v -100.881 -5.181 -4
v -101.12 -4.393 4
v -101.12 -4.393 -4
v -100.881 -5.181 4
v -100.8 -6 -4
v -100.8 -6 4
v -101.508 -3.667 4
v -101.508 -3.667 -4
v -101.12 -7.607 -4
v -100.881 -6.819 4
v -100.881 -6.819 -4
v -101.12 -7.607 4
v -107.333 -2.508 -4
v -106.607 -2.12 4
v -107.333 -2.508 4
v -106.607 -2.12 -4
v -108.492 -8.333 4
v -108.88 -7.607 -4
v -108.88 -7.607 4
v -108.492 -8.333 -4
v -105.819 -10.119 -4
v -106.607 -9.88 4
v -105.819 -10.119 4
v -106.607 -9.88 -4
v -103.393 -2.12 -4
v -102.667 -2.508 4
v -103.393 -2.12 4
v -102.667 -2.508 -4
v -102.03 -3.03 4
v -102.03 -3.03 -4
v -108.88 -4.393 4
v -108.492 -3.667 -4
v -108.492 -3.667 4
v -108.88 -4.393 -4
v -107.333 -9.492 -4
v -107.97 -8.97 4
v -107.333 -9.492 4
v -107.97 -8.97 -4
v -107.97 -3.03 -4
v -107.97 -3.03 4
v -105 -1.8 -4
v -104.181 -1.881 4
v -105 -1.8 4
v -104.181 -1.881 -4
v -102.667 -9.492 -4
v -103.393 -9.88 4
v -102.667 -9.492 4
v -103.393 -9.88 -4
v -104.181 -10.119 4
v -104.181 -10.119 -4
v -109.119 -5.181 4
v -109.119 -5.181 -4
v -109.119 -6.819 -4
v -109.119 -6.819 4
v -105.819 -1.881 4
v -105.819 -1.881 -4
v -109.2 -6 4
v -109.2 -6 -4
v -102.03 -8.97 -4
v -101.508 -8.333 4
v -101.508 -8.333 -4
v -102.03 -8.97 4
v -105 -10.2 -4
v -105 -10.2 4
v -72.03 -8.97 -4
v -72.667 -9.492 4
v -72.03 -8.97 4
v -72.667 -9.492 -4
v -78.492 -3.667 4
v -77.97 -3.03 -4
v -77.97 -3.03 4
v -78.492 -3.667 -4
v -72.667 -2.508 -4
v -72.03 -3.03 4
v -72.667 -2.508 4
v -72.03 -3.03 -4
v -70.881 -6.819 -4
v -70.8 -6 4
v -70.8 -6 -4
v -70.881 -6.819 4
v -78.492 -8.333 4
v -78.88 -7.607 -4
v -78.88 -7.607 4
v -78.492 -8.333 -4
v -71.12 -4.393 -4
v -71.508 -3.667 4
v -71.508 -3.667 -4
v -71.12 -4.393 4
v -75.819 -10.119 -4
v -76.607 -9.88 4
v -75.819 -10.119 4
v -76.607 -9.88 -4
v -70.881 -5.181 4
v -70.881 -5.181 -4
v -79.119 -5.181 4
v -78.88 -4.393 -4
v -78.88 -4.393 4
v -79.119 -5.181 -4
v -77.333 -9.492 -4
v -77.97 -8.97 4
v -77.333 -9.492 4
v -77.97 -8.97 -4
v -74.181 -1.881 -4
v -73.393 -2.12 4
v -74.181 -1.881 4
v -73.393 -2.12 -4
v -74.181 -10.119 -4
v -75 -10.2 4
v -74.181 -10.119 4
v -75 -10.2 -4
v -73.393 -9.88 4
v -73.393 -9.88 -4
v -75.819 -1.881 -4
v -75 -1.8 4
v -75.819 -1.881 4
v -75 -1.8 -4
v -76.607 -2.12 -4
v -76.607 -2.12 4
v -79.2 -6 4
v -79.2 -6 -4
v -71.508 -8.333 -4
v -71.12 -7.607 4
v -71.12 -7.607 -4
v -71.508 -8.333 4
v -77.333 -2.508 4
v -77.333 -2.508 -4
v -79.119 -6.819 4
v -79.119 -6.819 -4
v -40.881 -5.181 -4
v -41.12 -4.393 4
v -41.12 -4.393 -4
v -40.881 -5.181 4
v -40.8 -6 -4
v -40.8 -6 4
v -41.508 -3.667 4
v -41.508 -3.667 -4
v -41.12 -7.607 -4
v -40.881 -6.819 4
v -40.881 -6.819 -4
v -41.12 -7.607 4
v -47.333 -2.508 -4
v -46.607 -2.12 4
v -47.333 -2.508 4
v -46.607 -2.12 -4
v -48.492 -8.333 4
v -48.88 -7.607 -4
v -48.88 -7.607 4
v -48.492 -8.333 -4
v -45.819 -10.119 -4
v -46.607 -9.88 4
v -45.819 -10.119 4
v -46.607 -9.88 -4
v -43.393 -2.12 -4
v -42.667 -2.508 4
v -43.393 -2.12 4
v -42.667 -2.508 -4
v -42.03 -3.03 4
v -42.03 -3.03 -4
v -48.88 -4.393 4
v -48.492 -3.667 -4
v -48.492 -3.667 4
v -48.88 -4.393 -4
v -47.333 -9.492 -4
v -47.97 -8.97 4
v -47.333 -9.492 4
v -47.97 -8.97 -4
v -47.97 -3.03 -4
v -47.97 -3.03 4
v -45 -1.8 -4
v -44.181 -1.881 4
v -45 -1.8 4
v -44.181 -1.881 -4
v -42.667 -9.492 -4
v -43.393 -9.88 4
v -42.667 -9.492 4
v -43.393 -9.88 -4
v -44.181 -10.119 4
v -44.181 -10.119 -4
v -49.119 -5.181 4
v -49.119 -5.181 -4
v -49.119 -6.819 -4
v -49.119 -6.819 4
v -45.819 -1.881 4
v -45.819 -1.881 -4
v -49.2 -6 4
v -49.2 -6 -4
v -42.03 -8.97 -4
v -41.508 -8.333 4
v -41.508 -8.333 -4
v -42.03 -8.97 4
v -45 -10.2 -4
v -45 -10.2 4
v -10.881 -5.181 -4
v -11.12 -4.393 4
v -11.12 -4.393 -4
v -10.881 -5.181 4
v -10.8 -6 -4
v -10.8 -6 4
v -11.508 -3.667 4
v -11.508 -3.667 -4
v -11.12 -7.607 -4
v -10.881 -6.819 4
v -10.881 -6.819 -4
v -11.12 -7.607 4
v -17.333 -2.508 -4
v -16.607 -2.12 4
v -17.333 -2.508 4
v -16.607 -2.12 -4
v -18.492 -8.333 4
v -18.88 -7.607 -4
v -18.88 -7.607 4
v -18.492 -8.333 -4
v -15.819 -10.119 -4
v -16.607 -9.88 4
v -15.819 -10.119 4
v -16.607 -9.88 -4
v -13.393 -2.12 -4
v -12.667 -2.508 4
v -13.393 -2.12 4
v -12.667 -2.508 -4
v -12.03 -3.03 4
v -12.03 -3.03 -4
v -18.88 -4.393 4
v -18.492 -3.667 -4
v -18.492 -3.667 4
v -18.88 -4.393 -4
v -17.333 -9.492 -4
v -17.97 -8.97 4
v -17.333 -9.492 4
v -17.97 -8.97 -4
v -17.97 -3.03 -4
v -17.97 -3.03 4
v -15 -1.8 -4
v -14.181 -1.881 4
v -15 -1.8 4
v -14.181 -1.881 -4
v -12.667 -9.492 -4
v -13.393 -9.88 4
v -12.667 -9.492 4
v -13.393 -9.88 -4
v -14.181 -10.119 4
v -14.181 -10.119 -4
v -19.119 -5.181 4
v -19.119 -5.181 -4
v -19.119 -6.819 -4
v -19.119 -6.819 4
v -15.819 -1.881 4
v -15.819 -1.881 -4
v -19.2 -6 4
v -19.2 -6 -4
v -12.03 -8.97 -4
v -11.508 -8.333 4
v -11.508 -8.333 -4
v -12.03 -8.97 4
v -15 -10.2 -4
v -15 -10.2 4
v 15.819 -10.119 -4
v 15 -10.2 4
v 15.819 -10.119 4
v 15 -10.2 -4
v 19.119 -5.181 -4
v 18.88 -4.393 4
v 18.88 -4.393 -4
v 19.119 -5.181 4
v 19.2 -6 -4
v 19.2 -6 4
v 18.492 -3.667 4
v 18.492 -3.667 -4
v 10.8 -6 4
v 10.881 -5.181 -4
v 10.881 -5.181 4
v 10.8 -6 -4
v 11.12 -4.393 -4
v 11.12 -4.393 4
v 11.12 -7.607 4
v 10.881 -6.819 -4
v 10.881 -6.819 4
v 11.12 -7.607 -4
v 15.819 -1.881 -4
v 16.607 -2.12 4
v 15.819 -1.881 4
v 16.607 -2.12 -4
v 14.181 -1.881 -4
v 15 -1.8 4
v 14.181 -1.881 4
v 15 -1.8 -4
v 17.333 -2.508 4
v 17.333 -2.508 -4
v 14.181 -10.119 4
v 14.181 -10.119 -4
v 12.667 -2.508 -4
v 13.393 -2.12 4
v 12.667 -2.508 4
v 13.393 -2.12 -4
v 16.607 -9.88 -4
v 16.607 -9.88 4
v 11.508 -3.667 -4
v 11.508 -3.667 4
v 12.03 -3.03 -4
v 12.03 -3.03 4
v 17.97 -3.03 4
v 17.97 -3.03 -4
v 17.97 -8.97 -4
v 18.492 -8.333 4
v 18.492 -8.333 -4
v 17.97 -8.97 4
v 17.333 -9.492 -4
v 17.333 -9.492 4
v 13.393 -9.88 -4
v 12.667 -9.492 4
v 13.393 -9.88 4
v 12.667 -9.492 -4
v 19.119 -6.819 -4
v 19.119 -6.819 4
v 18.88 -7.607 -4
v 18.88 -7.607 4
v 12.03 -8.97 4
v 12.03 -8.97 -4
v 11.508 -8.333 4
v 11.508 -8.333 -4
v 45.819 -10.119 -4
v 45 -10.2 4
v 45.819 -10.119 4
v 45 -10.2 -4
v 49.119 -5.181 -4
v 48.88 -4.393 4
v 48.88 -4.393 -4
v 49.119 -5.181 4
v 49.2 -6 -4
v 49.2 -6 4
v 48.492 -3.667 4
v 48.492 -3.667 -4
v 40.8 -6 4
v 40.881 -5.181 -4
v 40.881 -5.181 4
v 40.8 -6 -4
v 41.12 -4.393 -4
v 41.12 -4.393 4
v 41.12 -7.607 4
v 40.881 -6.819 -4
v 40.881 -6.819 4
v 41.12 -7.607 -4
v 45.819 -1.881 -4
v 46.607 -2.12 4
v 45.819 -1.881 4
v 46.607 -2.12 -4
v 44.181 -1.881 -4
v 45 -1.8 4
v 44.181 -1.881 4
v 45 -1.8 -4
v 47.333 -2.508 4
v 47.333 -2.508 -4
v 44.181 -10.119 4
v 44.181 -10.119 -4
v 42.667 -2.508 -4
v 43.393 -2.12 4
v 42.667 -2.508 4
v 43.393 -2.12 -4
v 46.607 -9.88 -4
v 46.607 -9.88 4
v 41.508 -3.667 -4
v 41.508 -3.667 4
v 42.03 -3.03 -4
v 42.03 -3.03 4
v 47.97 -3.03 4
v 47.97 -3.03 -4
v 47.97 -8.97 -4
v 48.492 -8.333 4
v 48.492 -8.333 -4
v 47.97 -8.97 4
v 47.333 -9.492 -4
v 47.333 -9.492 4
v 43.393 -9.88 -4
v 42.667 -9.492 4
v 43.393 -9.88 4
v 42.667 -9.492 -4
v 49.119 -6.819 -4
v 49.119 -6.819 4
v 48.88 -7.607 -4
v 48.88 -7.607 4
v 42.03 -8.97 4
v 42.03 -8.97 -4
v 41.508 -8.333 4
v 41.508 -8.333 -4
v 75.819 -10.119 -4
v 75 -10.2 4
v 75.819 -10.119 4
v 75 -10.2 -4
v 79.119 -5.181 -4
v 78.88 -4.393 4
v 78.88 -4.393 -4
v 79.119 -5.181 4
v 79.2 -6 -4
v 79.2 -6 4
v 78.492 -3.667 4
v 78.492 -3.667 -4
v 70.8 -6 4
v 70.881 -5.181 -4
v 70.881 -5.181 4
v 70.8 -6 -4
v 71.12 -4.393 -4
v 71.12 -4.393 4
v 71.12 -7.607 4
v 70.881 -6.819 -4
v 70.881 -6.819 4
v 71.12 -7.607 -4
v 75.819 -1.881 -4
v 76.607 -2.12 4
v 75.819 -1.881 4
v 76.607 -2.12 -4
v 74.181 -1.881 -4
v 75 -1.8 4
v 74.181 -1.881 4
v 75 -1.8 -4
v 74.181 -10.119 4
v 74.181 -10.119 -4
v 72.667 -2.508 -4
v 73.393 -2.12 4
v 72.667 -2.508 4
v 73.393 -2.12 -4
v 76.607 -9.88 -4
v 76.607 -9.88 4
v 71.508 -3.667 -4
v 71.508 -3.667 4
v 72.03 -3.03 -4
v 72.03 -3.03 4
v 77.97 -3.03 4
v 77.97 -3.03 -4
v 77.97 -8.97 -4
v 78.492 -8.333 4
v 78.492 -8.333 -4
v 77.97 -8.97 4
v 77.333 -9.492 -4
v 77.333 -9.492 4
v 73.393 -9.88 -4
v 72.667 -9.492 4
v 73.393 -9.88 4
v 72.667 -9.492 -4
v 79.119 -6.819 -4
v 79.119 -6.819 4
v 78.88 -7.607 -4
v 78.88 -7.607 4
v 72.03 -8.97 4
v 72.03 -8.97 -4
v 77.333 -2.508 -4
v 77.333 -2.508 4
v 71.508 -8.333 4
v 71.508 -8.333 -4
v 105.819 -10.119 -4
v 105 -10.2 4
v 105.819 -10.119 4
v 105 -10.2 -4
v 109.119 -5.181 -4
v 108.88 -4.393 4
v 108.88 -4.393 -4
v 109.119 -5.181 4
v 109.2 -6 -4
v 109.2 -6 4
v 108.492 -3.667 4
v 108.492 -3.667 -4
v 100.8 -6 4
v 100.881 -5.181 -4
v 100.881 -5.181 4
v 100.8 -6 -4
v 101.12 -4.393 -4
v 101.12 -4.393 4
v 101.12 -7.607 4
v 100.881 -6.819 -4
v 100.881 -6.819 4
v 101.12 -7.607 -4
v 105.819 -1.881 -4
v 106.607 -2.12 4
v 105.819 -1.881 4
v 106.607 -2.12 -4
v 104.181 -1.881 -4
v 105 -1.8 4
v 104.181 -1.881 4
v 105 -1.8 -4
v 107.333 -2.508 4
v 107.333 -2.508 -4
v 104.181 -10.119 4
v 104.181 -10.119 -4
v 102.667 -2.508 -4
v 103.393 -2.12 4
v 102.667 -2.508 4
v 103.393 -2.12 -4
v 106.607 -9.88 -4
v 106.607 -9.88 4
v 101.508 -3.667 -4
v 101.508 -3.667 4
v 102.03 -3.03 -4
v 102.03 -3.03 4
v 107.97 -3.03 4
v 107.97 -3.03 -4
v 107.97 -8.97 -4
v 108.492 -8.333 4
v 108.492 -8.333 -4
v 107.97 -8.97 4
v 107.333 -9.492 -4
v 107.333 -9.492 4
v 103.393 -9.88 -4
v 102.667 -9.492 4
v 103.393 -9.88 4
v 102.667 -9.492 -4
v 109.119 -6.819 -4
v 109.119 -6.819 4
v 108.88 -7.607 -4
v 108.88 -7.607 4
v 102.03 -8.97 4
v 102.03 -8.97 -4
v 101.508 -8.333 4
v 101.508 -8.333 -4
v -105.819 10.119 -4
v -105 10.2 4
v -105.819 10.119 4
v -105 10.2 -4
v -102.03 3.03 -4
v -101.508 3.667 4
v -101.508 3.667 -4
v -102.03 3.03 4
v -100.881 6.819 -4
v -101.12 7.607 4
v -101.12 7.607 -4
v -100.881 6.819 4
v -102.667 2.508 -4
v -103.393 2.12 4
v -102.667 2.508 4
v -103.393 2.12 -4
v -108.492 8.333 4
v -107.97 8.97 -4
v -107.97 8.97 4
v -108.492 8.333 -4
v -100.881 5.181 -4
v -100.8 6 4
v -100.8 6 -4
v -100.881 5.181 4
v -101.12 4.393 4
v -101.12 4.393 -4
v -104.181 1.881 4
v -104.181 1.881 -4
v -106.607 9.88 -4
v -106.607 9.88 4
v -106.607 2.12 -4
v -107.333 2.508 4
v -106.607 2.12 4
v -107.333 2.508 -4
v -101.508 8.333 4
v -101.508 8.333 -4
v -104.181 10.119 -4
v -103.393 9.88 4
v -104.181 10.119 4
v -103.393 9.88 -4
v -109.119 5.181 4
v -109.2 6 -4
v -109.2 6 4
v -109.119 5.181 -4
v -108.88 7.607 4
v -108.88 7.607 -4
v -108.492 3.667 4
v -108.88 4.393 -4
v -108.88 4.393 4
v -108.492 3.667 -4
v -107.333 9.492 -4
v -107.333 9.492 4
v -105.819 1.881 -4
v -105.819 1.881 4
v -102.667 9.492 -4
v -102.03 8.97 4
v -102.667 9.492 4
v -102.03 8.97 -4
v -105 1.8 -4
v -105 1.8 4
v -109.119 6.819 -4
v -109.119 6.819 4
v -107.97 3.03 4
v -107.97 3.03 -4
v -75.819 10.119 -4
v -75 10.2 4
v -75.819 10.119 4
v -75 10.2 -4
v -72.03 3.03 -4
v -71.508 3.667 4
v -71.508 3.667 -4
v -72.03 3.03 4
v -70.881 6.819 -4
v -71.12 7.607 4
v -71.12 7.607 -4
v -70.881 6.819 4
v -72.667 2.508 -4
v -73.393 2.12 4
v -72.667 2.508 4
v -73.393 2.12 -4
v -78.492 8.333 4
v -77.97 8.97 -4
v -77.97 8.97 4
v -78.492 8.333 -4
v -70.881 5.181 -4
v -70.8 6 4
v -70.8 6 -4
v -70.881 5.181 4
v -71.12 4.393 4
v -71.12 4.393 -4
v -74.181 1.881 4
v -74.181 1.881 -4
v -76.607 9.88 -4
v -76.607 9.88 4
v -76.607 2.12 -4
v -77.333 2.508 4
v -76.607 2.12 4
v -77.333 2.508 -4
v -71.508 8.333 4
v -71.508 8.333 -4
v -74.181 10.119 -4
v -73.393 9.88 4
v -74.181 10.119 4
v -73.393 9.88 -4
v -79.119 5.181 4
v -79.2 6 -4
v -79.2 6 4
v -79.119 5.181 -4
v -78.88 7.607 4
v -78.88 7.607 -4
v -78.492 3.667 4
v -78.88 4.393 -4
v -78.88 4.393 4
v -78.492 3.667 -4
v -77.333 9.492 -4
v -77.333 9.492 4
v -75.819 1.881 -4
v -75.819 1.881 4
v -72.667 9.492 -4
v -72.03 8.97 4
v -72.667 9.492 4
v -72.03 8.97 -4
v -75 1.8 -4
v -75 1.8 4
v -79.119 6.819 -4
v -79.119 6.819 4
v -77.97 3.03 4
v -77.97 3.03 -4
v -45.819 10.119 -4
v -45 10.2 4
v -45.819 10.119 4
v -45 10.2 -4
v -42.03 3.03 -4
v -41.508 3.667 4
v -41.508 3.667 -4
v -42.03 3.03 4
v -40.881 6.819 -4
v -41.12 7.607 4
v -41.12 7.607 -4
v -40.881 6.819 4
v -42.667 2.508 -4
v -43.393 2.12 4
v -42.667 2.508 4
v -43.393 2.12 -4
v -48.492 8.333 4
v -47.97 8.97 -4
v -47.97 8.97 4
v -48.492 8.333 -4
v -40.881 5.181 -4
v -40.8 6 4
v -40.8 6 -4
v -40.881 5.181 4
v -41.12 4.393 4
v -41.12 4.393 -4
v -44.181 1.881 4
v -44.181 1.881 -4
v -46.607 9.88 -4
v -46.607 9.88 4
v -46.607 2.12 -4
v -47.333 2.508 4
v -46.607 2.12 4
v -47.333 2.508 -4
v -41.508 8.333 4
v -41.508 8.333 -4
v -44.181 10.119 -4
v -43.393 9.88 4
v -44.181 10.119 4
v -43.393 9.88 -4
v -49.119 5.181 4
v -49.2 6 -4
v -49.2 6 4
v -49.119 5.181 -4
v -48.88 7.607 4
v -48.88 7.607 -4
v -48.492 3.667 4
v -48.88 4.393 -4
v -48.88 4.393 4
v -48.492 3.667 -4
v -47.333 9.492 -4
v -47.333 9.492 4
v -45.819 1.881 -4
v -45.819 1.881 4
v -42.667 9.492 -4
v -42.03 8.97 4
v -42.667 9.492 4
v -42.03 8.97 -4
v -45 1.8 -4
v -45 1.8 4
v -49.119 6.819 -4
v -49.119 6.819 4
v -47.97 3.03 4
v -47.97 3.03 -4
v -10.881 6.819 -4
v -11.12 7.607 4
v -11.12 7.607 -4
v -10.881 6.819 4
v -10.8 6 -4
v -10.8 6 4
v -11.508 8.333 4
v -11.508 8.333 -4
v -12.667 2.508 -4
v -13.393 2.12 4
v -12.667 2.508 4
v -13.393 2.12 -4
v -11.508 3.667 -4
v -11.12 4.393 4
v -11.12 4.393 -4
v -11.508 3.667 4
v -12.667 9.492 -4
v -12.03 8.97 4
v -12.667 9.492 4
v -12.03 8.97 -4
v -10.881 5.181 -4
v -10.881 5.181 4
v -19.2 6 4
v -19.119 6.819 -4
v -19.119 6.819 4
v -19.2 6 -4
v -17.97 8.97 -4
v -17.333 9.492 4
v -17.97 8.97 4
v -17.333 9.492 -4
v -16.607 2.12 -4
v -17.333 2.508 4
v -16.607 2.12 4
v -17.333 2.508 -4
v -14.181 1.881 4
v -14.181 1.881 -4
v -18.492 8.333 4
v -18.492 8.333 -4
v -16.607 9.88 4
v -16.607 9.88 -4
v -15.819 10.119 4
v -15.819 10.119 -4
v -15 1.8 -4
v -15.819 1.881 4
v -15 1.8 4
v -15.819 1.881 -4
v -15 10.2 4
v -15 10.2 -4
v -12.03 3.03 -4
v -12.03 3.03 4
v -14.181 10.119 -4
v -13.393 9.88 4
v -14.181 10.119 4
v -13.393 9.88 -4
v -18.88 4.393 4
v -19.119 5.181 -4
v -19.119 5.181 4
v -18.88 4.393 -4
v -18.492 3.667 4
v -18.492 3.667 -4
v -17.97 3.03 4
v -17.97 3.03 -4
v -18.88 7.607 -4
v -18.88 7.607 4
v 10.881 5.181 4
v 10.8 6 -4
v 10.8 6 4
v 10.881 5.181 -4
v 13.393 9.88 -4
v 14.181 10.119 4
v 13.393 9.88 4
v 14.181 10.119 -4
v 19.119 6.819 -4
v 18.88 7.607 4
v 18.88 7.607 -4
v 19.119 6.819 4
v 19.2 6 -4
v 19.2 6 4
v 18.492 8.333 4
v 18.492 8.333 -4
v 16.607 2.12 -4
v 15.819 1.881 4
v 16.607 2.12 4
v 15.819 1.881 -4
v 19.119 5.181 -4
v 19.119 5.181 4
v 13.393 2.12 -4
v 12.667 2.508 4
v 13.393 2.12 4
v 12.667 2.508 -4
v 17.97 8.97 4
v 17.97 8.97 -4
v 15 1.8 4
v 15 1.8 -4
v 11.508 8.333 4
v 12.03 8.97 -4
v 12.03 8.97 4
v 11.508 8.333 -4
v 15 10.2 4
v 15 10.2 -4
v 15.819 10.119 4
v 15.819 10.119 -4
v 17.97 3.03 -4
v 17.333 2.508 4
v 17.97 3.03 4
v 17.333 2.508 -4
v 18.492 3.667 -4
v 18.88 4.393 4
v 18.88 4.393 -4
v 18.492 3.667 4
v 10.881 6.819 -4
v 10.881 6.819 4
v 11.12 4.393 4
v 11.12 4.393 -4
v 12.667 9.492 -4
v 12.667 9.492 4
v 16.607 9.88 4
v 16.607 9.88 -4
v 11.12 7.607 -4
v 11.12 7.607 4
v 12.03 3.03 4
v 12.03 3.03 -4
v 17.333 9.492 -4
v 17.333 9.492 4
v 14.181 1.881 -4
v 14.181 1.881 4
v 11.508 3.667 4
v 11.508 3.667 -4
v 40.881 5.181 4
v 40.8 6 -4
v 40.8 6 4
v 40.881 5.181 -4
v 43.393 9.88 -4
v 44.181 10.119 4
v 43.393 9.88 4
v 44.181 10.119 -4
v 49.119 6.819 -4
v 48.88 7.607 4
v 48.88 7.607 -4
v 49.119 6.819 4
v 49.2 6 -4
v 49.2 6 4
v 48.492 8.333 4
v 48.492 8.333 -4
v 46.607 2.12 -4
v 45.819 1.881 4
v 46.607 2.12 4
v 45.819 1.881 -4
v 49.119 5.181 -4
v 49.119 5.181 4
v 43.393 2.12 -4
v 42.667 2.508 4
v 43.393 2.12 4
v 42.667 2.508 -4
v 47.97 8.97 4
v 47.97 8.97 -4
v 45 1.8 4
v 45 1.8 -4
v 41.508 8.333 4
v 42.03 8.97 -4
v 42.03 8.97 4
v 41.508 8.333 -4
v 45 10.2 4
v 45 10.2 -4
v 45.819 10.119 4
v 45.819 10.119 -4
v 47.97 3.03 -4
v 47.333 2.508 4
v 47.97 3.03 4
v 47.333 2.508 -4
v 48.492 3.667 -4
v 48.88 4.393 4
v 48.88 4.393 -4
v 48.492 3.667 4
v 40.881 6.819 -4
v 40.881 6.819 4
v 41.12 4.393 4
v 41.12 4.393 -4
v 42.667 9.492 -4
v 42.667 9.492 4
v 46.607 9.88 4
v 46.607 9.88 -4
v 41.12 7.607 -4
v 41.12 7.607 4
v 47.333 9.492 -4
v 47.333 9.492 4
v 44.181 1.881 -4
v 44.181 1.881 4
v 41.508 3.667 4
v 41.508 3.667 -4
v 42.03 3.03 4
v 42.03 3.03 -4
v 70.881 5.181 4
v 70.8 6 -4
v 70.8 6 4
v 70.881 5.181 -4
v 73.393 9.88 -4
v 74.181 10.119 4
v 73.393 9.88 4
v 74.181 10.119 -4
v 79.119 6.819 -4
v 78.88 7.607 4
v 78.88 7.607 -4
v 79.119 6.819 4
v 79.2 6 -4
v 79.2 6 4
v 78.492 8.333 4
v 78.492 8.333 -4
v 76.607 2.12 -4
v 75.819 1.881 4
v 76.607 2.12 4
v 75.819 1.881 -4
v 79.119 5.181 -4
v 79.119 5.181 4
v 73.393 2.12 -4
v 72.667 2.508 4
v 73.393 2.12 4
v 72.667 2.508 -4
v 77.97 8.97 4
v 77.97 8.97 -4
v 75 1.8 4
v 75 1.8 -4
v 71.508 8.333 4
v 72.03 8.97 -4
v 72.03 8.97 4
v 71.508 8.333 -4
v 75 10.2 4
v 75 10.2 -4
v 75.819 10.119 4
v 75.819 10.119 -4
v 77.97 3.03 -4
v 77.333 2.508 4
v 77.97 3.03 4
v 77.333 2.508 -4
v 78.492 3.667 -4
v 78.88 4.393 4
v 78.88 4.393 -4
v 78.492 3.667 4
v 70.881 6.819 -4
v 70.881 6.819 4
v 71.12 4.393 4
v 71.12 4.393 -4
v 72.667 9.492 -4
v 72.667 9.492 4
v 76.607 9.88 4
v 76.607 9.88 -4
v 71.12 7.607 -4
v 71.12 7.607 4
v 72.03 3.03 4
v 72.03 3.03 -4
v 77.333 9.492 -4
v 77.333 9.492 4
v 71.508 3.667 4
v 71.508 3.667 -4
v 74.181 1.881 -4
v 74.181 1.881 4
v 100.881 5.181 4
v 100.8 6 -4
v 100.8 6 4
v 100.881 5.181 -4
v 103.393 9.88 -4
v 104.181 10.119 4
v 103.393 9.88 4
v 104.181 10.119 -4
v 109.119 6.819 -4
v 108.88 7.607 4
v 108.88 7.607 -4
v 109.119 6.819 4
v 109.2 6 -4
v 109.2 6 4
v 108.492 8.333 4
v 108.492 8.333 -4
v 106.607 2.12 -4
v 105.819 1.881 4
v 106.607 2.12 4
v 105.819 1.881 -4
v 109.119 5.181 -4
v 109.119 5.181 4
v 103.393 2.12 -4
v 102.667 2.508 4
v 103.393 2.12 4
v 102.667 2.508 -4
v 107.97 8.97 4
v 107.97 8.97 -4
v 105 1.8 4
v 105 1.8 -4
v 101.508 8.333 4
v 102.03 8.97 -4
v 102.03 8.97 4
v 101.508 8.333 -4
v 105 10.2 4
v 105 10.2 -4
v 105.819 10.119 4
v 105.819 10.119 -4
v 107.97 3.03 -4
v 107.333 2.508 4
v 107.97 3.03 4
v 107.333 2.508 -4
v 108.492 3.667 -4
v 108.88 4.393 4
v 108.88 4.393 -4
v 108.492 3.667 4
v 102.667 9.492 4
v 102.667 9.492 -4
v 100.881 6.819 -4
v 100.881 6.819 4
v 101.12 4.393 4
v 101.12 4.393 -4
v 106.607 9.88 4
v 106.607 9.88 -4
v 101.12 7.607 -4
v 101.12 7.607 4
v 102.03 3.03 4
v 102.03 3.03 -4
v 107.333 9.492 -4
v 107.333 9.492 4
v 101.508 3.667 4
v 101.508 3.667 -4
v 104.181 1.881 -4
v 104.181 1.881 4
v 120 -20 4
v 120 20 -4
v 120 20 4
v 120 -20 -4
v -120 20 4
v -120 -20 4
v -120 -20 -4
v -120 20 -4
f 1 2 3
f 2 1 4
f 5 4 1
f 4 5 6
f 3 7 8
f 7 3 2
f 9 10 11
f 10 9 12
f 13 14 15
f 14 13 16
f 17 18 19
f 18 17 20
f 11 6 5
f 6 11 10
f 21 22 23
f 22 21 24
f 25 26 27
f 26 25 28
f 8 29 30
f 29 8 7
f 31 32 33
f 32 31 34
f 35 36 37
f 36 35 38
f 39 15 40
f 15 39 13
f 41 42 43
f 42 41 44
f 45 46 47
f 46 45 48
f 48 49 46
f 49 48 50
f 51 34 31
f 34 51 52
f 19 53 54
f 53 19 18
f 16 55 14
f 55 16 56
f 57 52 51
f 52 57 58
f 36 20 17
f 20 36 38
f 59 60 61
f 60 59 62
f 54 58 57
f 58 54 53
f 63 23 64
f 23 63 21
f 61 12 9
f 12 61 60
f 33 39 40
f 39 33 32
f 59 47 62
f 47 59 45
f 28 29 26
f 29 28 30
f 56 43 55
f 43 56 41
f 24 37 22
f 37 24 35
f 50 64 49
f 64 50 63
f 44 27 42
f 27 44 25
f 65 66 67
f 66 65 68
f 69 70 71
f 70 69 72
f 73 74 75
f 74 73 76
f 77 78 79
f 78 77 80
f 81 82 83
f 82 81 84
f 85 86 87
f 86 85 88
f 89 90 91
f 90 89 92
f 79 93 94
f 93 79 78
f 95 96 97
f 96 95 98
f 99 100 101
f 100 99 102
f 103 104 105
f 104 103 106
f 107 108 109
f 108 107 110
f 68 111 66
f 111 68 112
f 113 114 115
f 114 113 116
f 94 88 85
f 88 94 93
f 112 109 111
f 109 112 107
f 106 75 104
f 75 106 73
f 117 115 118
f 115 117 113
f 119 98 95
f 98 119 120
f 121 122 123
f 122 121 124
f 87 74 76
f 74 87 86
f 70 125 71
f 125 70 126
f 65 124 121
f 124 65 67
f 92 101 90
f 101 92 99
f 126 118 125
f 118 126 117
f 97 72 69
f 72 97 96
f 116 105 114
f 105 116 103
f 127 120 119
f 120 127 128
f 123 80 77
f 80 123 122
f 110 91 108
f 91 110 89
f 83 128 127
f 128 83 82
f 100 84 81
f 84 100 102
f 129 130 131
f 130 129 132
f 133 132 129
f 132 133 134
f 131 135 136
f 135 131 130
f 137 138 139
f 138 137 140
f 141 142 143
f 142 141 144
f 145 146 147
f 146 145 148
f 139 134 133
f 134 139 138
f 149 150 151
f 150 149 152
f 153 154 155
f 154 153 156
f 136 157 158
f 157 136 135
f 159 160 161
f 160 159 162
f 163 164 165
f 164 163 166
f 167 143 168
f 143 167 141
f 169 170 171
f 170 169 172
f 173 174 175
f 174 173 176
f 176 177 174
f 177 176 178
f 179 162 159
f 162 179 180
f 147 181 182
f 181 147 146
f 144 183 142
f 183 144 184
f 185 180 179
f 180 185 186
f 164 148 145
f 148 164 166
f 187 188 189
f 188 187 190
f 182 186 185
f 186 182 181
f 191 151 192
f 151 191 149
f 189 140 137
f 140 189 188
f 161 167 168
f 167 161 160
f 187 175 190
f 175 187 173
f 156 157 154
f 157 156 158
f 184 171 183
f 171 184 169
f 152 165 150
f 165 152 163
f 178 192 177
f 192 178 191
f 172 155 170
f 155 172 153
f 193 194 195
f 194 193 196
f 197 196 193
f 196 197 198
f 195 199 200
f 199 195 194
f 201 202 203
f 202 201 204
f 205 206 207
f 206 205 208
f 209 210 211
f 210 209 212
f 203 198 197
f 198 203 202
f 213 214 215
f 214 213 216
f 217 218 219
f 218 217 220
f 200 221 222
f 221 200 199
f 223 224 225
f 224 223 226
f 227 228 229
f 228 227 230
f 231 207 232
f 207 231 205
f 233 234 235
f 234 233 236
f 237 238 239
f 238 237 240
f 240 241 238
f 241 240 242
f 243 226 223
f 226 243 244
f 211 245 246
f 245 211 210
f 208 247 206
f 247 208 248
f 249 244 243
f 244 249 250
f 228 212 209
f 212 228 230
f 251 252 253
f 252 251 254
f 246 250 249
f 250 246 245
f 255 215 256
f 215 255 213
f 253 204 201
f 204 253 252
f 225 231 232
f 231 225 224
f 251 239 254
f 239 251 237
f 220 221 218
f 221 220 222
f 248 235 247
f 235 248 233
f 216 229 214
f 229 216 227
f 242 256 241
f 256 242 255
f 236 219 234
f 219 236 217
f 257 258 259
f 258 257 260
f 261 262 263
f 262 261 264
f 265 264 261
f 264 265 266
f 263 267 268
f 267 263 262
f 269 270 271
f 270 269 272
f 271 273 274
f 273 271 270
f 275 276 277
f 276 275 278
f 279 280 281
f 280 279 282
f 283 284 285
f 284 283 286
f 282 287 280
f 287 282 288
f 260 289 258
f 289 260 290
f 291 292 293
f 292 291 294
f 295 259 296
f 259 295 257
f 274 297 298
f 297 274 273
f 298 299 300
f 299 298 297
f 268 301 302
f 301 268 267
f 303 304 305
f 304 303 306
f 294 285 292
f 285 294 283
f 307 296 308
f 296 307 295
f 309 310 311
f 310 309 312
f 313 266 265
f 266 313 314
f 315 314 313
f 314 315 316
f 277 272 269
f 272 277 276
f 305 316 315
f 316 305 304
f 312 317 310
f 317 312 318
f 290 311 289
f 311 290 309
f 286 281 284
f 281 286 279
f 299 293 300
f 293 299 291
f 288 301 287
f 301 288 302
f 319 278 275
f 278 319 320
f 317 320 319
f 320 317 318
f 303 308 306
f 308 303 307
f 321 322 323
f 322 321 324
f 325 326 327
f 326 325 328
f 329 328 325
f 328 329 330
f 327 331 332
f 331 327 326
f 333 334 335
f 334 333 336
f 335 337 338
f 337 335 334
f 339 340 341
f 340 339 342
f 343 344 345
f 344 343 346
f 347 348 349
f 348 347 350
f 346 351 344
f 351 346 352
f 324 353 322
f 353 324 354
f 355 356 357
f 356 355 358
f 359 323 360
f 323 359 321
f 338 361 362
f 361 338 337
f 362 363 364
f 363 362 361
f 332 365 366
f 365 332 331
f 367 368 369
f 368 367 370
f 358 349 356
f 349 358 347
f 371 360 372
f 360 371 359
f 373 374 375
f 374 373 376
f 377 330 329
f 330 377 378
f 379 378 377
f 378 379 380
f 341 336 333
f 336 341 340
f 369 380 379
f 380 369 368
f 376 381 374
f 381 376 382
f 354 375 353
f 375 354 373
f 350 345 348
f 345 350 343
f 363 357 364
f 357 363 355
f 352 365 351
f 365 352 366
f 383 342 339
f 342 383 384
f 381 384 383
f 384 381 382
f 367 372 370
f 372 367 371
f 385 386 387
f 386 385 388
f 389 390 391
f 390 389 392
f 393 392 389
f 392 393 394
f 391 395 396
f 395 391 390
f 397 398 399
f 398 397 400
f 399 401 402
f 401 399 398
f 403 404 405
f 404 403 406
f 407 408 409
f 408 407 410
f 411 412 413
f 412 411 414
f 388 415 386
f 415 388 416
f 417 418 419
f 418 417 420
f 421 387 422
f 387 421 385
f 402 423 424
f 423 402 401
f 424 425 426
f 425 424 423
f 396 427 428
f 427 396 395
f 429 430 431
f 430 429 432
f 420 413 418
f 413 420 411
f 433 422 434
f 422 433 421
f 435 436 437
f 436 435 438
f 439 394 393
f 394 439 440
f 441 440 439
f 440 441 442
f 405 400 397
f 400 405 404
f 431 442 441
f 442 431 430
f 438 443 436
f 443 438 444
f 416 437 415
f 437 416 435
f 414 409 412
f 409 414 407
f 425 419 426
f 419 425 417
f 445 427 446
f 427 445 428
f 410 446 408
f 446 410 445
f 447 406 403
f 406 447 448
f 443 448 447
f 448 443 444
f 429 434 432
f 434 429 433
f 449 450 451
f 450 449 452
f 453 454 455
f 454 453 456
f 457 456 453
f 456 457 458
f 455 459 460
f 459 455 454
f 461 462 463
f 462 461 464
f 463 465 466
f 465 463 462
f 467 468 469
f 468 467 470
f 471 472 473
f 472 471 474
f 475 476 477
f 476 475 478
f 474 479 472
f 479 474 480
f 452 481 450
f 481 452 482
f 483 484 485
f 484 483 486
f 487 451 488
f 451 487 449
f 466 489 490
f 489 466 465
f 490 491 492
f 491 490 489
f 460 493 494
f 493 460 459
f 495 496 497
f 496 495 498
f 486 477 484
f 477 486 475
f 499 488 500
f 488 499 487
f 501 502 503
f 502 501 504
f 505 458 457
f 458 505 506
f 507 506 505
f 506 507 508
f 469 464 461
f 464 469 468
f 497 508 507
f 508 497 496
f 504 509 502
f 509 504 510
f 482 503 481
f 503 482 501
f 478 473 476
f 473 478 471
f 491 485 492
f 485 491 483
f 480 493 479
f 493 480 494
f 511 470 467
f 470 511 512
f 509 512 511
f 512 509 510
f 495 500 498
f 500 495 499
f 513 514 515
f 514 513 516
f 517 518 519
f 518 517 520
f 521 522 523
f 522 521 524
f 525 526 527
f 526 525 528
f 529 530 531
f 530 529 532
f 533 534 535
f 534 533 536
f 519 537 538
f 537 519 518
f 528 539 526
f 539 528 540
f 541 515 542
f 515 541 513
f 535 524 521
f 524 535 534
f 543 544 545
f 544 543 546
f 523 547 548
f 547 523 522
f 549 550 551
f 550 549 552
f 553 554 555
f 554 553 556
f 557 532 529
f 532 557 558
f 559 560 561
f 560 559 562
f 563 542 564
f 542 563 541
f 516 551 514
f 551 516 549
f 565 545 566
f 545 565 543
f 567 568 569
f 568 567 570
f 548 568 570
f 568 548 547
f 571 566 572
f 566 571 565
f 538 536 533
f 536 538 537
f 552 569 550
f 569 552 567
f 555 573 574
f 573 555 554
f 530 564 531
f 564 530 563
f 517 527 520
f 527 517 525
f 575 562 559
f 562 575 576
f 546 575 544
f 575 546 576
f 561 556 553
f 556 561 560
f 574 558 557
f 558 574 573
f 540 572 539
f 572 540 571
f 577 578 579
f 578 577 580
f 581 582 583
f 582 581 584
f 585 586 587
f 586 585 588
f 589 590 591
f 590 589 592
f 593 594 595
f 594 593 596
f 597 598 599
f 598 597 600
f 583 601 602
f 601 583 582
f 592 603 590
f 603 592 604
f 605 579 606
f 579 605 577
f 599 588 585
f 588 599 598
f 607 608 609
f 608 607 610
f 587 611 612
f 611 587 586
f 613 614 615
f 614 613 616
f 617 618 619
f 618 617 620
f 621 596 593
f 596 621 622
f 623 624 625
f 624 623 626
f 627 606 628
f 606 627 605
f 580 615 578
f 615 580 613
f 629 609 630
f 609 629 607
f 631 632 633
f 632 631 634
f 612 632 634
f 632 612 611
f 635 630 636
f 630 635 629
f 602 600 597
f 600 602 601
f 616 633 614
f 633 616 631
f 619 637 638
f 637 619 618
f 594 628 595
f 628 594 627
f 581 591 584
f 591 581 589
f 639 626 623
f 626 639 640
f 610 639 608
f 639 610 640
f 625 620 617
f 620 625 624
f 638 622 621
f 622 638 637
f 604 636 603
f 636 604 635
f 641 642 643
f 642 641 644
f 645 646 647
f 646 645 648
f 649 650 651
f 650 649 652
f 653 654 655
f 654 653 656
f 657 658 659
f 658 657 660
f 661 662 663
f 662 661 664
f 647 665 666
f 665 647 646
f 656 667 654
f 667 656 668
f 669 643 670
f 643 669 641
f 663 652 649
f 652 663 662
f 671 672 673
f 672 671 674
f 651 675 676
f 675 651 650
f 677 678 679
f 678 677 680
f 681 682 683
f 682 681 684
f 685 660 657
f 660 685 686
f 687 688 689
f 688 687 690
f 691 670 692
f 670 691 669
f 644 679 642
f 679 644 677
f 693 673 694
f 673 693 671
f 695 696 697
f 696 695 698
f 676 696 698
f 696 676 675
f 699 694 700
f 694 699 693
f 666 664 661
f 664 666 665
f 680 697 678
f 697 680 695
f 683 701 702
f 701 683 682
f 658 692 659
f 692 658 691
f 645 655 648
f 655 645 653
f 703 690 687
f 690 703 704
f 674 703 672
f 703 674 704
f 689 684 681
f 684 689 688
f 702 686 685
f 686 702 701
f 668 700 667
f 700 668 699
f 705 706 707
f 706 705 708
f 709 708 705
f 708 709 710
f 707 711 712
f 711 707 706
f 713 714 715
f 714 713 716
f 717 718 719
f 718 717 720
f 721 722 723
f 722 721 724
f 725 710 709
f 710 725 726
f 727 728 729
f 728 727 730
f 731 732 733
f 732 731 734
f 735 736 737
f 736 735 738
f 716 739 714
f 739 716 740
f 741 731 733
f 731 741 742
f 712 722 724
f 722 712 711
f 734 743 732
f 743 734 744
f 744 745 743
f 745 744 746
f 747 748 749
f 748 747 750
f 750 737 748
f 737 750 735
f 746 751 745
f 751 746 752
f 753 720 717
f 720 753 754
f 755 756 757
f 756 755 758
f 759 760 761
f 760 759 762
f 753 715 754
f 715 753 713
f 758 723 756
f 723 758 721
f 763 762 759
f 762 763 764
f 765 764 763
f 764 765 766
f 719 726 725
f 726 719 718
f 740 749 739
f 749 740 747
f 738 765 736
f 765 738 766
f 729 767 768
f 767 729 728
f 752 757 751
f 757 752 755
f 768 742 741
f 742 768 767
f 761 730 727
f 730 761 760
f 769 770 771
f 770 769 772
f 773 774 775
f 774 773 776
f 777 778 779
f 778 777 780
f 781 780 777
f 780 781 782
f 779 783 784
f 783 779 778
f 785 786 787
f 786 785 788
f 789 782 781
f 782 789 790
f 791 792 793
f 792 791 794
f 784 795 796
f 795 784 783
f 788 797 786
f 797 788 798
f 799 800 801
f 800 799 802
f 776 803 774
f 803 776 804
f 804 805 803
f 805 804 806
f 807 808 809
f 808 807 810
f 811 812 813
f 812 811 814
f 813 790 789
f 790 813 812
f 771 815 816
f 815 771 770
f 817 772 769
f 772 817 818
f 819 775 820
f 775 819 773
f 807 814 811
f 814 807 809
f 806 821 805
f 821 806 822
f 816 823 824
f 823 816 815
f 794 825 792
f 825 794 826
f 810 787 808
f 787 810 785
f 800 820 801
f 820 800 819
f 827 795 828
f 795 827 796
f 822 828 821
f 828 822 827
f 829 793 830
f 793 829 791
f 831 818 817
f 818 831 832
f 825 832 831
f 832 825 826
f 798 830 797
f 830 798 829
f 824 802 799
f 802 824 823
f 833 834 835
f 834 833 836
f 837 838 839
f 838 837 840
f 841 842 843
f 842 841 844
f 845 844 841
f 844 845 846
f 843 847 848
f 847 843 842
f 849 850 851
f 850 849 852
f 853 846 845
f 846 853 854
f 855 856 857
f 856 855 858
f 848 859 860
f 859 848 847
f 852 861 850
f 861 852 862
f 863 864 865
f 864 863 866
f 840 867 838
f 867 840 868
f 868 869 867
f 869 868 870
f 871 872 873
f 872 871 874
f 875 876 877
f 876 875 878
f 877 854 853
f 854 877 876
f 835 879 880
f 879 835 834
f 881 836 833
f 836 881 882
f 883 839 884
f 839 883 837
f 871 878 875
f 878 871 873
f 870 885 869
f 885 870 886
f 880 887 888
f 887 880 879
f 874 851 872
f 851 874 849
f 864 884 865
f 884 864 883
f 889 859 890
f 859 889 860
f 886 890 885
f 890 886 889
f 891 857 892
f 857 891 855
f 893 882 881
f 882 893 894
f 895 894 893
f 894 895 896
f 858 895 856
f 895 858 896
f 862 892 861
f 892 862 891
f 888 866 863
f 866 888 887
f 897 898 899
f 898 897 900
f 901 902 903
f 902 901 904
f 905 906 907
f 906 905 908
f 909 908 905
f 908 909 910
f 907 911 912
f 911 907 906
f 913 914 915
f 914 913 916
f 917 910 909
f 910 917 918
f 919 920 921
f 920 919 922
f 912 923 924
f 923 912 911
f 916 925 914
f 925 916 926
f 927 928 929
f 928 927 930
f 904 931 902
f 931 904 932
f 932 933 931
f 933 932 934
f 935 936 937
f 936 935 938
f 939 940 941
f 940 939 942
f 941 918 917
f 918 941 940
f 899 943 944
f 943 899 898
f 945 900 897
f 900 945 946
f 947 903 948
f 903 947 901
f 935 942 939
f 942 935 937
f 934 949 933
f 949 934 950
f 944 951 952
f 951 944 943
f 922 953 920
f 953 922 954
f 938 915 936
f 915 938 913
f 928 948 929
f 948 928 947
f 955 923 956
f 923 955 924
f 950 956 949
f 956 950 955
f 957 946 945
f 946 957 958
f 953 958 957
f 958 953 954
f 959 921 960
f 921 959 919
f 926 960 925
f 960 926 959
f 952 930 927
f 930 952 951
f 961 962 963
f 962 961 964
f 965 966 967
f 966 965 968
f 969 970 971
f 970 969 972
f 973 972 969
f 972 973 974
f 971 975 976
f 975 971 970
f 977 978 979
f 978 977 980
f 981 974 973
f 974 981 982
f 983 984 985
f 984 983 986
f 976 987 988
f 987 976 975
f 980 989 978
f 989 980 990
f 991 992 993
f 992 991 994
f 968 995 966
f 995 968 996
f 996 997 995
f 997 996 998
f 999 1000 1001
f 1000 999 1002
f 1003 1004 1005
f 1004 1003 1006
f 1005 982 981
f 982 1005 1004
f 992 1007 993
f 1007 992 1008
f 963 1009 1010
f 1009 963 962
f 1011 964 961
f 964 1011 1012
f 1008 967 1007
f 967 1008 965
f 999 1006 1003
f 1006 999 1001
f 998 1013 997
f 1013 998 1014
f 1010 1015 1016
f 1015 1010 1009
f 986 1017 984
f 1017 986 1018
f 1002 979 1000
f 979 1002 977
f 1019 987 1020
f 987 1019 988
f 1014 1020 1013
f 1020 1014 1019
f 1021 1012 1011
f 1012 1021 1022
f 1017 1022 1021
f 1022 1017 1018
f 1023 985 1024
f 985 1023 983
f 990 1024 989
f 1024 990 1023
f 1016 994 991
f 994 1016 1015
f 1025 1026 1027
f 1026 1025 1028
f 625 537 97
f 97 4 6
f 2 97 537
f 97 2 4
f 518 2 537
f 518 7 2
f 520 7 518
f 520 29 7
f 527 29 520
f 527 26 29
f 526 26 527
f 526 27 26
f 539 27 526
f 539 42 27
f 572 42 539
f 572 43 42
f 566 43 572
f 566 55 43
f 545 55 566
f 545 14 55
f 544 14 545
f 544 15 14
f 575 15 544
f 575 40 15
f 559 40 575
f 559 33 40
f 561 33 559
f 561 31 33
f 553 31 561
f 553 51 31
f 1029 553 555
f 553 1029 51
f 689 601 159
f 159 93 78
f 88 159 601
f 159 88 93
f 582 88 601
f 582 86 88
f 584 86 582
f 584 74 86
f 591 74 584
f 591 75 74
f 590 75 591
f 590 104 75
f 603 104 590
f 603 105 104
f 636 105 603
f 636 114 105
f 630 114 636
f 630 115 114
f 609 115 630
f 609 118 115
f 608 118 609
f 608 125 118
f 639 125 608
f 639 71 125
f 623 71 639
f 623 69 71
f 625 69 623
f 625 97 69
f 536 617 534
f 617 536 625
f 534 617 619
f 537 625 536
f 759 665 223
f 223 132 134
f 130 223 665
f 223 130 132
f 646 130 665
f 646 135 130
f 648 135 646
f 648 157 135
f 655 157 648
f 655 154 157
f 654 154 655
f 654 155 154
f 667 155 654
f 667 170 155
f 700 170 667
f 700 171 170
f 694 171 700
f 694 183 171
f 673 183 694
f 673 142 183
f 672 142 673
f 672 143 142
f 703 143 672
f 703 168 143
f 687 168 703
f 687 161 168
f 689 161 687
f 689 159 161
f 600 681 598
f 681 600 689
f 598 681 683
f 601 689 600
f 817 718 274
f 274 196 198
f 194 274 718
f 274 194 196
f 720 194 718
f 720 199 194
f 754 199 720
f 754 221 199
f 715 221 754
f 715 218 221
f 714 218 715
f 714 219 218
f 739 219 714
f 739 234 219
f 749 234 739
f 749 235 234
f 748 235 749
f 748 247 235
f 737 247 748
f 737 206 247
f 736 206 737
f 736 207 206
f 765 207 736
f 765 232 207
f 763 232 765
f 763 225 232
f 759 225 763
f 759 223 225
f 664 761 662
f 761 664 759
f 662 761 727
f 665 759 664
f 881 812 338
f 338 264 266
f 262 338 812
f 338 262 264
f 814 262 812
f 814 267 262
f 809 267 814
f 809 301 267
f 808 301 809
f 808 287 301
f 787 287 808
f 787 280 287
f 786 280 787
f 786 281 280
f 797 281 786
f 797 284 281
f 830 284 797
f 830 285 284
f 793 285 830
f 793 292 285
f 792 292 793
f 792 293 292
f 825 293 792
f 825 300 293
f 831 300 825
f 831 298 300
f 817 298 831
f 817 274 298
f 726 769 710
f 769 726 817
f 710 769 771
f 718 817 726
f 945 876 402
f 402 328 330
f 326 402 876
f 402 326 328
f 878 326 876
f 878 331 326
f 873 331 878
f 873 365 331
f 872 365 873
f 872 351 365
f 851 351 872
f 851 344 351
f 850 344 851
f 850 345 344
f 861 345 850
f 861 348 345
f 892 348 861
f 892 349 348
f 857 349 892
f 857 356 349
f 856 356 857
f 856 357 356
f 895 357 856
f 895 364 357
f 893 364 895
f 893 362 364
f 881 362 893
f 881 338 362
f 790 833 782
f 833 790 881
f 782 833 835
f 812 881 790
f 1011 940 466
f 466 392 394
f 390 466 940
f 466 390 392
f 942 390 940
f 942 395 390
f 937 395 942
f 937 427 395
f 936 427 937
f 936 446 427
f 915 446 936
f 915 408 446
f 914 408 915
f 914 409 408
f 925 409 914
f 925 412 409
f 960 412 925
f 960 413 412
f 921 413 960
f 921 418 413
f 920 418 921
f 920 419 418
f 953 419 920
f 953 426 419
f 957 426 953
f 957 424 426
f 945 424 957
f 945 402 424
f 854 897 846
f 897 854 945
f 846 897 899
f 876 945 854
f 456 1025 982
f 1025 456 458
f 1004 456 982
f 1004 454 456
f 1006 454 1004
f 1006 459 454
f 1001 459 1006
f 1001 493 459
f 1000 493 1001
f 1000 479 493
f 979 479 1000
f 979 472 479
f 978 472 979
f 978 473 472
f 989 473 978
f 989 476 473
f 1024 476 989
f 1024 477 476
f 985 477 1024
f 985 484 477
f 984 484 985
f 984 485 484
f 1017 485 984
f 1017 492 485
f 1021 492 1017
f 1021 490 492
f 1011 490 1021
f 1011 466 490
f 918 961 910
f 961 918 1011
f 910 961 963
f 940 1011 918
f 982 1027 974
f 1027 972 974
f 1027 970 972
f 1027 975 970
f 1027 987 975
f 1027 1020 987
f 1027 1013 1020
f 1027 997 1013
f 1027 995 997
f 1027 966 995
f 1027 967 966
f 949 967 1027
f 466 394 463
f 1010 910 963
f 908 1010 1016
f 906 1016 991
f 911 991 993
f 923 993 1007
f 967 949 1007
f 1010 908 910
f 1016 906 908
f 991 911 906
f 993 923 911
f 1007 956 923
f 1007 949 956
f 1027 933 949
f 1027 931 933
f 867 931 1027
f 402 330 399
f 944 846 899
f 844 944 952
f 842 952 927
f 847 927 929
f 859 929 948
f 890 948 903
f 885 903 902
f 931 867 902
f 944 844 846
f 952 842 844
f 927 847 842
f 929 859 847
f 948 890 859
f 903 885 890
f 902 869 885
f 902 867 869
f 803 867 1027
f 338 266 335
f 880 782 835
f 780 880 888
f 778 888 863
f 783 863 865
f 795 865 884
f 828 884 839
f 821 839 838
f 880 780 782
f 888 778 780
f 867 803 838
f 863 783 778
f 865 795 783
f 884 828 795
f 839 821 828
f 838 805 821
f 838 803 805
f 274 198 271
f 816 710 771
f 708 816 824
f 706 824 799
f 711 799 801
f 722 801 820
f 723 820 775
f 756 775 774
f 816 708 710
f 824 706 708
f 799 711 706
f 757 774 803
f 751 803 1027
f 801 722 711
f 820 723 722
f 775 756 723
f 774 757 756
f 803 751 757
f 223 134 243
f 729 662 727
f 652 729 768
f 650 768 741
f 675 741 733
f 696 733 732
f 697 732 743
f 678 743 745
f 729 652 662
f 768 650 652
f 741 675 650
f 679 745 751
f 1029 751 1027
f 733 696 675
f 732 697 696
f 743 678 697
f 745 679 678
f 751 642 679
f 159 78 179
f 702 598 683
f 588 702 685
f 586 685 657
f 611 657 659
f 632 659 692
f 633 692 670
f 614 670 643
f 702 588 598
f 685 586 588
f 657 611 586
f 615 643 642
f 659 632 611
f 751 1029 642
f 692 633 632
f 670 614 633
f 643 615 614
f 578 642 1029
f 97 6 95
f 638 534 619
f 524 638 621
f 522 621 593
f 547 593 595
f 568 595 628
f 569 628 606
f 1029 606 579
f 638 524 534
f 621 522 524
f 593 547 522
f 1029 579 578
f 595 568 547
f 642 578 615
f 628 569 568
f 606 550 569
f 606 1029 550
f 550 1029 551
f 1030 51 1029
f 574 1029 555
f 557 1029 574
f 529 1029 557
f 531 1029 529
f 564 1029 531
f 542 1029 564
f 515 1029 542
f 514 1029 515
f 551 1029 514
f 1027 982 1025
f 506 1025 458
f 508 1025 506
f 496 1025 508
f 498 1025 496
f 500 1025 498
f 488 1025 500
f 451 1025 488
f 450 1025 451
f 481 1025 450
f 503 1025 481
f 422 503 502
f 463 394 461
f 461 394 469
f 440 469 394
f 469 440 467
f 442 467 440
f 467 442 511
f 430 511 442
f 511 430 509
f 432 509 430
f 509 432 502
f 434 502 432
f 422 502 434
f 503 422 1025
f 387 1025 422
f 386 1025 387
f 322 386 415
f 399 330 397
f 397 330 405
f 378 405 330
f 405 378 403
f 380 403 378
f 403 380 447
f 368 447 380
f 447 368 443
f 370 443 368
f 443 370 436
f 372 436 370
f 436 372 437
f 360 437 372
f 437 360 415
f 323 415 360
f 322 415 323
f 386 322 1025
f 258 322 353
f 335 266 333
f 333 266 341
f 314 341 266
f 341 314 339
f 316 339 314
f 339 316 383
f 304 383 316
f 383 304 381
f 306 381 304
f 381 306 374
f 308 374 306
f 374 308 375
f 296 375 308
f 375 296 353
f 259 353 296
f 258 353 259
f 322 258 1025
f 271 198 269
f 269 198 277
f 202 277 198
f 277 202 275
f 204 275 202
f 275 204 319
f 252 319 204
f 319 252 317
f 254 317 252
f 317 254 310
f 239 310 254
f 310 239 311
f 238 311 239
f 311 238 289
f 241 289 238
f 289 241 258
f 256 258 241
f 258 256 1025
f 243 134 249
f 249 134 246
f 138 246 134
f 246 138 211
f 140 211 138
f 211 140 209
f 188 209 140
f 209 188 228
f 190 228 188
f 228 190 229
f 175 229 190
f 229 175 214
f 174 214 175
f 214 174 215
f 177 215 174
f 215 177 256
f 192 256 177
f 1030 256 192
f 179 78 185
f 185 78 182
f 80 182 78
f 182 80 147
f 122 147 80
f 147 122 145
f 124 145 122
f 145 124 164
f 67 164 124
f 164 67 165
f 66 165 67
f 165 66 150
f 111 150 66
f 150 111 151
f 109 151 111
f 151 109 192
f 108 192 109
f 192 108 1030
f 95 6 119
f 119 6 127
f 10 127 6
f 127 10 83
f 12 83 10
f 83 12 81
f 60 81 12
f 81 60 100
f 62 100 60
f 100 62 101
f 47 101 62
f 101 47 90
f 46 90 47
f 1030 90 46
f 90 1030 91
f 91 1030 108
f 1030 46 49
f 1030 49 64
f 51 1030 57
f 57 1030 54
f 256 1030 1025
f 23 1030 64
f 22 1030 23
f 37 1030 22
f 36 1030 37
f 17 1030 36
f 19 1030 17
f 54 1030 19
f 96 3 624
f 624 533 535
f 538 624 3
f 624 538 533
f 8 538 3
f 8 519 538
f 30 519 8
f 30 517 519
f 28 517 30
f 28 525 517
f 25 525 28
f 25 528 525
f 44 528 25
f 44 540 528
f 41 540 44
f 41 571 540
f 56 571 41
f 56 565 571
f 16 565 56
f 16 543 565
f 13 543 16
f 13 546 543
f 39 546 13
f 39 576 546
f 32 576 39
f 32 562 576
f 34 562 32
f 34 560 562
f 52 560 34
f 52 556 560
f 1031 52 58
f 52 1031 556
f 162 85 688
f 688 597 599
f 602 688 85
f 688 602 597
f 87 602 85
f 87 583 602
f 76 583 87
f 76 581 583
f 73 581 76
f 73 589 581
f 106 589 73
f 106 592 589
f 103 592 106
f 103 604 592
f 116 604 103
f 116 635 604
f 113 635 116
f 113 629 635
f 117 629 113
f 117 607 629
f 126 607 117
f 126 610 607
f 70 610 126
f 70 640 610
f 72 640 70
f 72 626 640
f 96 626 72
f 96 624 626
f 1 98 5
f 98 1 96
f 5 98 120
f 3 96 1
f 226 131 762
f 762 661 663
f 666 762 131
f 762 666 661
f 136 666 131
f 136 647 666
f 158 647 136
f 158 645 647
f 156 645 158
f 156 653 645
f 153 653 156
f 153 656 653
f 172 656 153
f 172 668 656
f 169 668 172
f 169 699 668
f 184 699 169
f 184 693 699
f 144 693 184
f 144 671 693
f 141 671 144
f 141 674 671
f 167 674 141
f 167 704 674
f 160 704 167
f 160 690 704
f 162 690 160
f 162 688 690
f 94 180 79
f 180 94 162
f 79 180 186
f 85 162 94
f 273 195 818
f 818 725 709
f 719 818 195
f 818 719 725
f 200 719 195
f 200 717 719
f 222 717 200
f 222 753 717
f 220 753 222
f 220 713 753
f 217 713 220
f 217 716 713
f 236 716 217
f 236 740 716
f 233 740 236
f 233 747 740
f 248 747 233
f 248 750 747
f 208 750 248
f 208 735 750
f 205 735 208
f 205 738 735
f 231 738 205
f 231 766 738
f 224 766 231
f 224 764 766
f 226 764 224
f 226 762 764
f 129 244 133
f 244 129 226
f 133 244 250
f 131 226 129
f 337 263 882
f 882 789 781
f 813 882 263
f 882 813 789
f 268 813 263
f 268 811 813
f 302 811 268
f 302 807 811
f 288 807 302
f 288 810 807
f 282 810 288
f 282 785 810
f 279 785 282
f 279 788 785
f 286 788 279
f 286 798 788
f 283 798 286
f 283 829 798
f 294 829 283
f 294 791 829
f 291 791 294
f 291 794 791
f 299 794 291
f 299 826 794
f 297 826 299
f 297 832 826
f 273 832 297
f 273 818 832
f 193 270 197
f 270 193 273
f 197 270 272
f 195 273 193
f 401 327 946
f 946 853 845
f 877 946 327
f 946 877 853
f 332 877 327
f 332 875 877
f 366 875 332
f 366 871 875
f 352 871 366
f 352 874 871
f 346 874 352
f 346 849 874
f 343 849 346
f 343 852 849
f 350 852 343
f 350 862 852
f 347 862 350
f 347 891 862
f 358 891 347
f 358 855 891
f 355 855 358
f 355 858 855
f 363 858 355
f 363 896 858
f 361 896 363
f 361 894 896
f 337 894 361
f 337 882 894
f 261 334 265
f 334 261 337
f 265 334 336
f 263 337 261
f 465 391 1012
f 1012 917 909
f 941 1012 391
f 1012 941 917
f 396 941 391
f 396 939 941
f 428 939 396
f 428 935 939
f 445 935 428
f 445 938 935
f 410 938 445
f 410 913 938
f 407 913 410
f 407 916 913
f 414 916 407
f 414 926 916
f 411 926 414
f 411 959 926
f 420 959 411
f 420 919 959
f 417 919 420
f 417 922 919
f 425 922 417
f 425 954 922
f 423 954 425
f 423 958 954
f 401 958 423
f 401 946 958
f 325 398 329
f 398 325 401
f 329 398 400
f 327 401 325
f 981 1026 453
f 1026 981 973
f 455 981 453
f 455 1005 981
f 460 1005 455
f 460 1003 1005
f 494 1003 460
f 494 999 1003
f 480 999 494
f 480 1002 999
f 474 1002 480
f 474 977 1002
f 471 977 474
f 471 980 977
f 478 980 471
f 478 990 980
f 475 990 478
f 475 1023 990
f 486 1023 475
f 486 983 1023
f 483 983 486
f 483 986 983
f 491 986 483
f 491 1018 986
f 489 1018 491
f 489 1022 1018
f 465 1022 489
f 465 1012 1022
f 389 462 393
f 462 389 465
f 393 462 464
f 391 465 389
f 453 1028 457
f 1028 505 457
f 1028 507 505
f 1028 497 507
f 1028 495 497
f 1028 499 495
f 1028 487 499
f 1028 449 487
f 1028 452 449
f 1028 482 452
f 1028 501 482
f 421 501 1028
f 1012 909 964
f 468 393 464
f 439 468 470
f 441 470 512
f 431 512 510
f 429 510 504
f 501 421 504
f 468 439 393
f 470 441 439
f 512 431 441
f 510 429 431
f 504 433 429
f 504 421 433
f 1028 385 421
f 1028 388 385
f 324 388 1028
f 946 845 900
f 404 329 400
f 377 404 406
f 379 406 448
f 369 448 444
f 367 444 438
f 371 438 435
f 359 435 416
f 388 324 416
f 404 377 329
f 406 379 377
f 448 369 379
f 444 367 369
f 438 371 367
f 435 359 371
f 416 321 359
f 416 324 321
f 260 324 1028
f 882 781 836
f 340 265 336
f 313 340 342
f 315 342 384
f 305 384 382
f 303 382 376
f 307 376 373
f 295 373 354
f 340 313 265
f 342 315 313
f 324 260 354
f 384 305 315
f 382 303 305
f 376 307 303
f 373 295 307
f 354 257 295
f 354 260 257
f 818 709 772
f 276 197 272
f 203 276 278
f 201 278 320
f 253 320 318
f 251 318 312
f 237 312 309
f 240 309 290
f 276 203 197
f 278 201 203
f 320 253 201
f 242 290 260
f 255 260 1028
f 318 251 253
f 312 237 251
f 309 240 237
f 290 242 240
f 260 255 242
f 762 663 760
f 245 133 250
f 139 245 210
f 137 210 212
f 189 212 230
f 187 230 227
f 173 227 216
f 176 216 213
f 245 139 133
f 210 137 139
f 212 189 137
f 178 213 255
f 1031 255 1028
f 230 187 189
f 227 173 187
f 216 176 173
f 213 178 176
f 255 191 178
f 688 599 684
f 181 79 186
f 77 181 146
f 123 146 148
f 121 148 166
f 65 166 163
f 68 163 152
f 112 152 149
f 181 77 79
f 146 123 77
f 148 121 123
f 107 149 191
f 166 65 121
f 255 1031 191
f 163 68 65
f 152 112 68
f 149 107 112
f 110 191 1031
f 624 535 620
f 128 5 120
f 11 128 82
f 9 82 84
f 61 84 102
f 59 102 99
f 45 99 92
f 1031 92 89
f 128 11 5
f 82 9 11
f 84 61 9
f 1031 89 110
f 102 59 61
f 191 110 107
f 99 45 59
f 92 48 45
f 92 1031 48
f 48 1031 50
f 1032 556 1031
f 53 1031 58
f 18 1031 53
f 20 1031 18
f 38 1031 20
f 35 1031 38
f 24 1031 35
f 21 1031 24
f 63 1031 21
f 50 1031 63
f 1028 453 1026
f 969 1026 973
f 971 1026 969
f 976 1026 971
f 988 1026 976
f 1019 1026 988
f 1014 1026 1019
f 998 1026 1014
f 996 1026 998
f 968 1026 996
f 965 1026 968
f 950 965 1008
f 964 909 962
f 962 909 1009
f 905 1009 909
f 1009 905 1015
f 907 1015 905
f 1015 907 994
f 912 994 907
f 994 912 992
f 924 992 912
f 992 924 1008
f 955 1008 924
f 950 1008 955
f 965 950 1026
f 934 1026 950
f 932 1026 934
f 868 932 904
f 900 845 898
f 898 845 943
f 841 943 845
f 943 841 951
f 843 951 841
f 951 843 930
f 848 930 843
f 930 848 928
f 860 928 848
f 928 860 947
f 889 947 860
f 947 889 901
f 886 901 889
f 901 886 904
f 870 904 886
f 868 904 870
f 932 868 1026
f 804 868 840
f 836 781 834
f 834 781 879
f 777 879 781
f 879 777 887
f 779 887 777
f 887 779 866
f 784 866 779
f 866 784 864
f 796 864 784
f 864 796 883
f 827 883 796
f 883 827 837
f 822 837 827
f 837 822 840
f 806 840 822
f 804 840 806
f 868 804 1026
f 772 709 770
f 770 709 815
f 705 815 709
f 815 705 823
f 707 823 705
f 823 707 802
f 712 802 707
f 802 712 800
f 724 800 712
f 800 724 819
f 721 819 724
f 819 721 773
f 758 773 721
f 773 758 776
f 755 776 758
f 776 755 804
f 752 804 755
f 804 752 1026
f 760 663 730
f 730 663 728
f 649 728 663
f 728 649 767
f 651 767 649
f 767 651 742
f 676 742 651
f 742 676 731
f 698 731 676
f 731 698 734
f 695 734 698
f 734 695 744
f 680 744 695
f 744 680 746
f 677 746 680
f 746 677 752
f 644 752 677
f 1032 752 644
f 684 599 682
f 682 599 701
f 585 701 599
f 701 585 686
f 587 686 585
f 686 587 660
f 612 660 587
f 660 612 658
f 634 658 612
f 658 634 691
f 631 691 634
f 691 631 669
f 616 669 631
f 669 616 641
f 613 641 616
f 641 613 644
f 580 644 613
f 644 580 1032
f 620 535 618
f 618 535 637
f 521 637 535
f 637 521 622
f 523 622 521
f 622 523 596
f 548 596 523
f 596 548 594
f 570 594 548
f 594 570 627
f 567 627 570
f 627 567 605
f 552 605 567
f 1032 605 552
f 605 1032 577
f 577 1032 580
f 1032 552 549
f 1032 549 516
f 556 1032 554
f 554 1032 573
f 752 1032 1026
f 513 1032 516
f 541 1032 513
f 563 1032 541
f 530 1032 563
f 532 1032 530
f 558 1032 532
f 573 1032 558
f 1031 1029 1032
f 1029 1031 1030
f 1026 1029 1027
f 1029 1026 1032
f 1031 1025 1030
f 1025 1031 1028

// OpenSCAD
$fn = 32;

// ----------------------------------------------------------------------
// Hole bar, 8 x Ø8.4
// tworows layout, 15 mm edge offset
// ----------------------------------------------------------------------

// --- parameters (mm) ---
bar_w = 40;       // bar width (Y)
bar_t = 8;        // bar thickness (Z)
holes = 8;        // holes per row
hole_d = 8.4;     // hole diameter
edge = 15;        // offset from the bar end to the first hole
pitch = 30;       // pitch between neighbouring holes
row_offset = 12;  // distance between the two rows

// --- derived feature positions (mm) ---
span = (holes - 1) * pitch;   // = 210   distance between the end holes
bar_l = span + 2 * edge;      // = 240   overall bar length
start_x = -bar_l / 2 + edge;  // = -105   X of the first hole
feature_centers = [
  [start_x + 0 * pitch, -row_offset / 2],
  [start_x + 1 * pitch, -row_offset / 2],
  [start_x + 2 * pitch, -row_offset / 2],
  [start_x + 3 * pitch, -row_offset / 2],
  [start_x + 4 * pitch, -row_offset / 2],
  [start_x + 5 * pitch, -row_offset / 2],
  [start_x + 6 * pitch, -row_offset / 2],
  [start_x + 7 * pitch, -row_offset / 2]
];   // hole centres of the first row
row2_centers = [
  [start_x + 0 * pitch, row_offset / 2],
  [start_x + 1 * pitch, row_offset / 2],
  [start_x + 2 * pitch, row_offset / 2],
  [start_x + 3 * pitch, row_offset / 2],
  [start_x + 4 * pitch, row_offset / 2],
  [start_x + 5 * pitch, row_offset / 2],
  [start_x + 6 * pitch, row_offset / 2],
  [start_x + 7 * pitch, row_offset / 2]
];   // hole centres of the second row

// bar with two rows of holes, both read from their own centre arrays
difference() {
  translate([-bar_l / 2, -bar_w / 2, -bar_t / 2]) cube([bar_l, bar_w, bar_t]);
  for (centre = feature_centers)
    translate([centre[0], centre[1], 0])
      cylinder(d = hole_d, h = bar_t + 2, center = true);
  for (centre = row2_centers)
    translate([centre[0], centre[1], 0])
      cylinder(d = hole_d, h = bar_t + 2, center = true);
}
